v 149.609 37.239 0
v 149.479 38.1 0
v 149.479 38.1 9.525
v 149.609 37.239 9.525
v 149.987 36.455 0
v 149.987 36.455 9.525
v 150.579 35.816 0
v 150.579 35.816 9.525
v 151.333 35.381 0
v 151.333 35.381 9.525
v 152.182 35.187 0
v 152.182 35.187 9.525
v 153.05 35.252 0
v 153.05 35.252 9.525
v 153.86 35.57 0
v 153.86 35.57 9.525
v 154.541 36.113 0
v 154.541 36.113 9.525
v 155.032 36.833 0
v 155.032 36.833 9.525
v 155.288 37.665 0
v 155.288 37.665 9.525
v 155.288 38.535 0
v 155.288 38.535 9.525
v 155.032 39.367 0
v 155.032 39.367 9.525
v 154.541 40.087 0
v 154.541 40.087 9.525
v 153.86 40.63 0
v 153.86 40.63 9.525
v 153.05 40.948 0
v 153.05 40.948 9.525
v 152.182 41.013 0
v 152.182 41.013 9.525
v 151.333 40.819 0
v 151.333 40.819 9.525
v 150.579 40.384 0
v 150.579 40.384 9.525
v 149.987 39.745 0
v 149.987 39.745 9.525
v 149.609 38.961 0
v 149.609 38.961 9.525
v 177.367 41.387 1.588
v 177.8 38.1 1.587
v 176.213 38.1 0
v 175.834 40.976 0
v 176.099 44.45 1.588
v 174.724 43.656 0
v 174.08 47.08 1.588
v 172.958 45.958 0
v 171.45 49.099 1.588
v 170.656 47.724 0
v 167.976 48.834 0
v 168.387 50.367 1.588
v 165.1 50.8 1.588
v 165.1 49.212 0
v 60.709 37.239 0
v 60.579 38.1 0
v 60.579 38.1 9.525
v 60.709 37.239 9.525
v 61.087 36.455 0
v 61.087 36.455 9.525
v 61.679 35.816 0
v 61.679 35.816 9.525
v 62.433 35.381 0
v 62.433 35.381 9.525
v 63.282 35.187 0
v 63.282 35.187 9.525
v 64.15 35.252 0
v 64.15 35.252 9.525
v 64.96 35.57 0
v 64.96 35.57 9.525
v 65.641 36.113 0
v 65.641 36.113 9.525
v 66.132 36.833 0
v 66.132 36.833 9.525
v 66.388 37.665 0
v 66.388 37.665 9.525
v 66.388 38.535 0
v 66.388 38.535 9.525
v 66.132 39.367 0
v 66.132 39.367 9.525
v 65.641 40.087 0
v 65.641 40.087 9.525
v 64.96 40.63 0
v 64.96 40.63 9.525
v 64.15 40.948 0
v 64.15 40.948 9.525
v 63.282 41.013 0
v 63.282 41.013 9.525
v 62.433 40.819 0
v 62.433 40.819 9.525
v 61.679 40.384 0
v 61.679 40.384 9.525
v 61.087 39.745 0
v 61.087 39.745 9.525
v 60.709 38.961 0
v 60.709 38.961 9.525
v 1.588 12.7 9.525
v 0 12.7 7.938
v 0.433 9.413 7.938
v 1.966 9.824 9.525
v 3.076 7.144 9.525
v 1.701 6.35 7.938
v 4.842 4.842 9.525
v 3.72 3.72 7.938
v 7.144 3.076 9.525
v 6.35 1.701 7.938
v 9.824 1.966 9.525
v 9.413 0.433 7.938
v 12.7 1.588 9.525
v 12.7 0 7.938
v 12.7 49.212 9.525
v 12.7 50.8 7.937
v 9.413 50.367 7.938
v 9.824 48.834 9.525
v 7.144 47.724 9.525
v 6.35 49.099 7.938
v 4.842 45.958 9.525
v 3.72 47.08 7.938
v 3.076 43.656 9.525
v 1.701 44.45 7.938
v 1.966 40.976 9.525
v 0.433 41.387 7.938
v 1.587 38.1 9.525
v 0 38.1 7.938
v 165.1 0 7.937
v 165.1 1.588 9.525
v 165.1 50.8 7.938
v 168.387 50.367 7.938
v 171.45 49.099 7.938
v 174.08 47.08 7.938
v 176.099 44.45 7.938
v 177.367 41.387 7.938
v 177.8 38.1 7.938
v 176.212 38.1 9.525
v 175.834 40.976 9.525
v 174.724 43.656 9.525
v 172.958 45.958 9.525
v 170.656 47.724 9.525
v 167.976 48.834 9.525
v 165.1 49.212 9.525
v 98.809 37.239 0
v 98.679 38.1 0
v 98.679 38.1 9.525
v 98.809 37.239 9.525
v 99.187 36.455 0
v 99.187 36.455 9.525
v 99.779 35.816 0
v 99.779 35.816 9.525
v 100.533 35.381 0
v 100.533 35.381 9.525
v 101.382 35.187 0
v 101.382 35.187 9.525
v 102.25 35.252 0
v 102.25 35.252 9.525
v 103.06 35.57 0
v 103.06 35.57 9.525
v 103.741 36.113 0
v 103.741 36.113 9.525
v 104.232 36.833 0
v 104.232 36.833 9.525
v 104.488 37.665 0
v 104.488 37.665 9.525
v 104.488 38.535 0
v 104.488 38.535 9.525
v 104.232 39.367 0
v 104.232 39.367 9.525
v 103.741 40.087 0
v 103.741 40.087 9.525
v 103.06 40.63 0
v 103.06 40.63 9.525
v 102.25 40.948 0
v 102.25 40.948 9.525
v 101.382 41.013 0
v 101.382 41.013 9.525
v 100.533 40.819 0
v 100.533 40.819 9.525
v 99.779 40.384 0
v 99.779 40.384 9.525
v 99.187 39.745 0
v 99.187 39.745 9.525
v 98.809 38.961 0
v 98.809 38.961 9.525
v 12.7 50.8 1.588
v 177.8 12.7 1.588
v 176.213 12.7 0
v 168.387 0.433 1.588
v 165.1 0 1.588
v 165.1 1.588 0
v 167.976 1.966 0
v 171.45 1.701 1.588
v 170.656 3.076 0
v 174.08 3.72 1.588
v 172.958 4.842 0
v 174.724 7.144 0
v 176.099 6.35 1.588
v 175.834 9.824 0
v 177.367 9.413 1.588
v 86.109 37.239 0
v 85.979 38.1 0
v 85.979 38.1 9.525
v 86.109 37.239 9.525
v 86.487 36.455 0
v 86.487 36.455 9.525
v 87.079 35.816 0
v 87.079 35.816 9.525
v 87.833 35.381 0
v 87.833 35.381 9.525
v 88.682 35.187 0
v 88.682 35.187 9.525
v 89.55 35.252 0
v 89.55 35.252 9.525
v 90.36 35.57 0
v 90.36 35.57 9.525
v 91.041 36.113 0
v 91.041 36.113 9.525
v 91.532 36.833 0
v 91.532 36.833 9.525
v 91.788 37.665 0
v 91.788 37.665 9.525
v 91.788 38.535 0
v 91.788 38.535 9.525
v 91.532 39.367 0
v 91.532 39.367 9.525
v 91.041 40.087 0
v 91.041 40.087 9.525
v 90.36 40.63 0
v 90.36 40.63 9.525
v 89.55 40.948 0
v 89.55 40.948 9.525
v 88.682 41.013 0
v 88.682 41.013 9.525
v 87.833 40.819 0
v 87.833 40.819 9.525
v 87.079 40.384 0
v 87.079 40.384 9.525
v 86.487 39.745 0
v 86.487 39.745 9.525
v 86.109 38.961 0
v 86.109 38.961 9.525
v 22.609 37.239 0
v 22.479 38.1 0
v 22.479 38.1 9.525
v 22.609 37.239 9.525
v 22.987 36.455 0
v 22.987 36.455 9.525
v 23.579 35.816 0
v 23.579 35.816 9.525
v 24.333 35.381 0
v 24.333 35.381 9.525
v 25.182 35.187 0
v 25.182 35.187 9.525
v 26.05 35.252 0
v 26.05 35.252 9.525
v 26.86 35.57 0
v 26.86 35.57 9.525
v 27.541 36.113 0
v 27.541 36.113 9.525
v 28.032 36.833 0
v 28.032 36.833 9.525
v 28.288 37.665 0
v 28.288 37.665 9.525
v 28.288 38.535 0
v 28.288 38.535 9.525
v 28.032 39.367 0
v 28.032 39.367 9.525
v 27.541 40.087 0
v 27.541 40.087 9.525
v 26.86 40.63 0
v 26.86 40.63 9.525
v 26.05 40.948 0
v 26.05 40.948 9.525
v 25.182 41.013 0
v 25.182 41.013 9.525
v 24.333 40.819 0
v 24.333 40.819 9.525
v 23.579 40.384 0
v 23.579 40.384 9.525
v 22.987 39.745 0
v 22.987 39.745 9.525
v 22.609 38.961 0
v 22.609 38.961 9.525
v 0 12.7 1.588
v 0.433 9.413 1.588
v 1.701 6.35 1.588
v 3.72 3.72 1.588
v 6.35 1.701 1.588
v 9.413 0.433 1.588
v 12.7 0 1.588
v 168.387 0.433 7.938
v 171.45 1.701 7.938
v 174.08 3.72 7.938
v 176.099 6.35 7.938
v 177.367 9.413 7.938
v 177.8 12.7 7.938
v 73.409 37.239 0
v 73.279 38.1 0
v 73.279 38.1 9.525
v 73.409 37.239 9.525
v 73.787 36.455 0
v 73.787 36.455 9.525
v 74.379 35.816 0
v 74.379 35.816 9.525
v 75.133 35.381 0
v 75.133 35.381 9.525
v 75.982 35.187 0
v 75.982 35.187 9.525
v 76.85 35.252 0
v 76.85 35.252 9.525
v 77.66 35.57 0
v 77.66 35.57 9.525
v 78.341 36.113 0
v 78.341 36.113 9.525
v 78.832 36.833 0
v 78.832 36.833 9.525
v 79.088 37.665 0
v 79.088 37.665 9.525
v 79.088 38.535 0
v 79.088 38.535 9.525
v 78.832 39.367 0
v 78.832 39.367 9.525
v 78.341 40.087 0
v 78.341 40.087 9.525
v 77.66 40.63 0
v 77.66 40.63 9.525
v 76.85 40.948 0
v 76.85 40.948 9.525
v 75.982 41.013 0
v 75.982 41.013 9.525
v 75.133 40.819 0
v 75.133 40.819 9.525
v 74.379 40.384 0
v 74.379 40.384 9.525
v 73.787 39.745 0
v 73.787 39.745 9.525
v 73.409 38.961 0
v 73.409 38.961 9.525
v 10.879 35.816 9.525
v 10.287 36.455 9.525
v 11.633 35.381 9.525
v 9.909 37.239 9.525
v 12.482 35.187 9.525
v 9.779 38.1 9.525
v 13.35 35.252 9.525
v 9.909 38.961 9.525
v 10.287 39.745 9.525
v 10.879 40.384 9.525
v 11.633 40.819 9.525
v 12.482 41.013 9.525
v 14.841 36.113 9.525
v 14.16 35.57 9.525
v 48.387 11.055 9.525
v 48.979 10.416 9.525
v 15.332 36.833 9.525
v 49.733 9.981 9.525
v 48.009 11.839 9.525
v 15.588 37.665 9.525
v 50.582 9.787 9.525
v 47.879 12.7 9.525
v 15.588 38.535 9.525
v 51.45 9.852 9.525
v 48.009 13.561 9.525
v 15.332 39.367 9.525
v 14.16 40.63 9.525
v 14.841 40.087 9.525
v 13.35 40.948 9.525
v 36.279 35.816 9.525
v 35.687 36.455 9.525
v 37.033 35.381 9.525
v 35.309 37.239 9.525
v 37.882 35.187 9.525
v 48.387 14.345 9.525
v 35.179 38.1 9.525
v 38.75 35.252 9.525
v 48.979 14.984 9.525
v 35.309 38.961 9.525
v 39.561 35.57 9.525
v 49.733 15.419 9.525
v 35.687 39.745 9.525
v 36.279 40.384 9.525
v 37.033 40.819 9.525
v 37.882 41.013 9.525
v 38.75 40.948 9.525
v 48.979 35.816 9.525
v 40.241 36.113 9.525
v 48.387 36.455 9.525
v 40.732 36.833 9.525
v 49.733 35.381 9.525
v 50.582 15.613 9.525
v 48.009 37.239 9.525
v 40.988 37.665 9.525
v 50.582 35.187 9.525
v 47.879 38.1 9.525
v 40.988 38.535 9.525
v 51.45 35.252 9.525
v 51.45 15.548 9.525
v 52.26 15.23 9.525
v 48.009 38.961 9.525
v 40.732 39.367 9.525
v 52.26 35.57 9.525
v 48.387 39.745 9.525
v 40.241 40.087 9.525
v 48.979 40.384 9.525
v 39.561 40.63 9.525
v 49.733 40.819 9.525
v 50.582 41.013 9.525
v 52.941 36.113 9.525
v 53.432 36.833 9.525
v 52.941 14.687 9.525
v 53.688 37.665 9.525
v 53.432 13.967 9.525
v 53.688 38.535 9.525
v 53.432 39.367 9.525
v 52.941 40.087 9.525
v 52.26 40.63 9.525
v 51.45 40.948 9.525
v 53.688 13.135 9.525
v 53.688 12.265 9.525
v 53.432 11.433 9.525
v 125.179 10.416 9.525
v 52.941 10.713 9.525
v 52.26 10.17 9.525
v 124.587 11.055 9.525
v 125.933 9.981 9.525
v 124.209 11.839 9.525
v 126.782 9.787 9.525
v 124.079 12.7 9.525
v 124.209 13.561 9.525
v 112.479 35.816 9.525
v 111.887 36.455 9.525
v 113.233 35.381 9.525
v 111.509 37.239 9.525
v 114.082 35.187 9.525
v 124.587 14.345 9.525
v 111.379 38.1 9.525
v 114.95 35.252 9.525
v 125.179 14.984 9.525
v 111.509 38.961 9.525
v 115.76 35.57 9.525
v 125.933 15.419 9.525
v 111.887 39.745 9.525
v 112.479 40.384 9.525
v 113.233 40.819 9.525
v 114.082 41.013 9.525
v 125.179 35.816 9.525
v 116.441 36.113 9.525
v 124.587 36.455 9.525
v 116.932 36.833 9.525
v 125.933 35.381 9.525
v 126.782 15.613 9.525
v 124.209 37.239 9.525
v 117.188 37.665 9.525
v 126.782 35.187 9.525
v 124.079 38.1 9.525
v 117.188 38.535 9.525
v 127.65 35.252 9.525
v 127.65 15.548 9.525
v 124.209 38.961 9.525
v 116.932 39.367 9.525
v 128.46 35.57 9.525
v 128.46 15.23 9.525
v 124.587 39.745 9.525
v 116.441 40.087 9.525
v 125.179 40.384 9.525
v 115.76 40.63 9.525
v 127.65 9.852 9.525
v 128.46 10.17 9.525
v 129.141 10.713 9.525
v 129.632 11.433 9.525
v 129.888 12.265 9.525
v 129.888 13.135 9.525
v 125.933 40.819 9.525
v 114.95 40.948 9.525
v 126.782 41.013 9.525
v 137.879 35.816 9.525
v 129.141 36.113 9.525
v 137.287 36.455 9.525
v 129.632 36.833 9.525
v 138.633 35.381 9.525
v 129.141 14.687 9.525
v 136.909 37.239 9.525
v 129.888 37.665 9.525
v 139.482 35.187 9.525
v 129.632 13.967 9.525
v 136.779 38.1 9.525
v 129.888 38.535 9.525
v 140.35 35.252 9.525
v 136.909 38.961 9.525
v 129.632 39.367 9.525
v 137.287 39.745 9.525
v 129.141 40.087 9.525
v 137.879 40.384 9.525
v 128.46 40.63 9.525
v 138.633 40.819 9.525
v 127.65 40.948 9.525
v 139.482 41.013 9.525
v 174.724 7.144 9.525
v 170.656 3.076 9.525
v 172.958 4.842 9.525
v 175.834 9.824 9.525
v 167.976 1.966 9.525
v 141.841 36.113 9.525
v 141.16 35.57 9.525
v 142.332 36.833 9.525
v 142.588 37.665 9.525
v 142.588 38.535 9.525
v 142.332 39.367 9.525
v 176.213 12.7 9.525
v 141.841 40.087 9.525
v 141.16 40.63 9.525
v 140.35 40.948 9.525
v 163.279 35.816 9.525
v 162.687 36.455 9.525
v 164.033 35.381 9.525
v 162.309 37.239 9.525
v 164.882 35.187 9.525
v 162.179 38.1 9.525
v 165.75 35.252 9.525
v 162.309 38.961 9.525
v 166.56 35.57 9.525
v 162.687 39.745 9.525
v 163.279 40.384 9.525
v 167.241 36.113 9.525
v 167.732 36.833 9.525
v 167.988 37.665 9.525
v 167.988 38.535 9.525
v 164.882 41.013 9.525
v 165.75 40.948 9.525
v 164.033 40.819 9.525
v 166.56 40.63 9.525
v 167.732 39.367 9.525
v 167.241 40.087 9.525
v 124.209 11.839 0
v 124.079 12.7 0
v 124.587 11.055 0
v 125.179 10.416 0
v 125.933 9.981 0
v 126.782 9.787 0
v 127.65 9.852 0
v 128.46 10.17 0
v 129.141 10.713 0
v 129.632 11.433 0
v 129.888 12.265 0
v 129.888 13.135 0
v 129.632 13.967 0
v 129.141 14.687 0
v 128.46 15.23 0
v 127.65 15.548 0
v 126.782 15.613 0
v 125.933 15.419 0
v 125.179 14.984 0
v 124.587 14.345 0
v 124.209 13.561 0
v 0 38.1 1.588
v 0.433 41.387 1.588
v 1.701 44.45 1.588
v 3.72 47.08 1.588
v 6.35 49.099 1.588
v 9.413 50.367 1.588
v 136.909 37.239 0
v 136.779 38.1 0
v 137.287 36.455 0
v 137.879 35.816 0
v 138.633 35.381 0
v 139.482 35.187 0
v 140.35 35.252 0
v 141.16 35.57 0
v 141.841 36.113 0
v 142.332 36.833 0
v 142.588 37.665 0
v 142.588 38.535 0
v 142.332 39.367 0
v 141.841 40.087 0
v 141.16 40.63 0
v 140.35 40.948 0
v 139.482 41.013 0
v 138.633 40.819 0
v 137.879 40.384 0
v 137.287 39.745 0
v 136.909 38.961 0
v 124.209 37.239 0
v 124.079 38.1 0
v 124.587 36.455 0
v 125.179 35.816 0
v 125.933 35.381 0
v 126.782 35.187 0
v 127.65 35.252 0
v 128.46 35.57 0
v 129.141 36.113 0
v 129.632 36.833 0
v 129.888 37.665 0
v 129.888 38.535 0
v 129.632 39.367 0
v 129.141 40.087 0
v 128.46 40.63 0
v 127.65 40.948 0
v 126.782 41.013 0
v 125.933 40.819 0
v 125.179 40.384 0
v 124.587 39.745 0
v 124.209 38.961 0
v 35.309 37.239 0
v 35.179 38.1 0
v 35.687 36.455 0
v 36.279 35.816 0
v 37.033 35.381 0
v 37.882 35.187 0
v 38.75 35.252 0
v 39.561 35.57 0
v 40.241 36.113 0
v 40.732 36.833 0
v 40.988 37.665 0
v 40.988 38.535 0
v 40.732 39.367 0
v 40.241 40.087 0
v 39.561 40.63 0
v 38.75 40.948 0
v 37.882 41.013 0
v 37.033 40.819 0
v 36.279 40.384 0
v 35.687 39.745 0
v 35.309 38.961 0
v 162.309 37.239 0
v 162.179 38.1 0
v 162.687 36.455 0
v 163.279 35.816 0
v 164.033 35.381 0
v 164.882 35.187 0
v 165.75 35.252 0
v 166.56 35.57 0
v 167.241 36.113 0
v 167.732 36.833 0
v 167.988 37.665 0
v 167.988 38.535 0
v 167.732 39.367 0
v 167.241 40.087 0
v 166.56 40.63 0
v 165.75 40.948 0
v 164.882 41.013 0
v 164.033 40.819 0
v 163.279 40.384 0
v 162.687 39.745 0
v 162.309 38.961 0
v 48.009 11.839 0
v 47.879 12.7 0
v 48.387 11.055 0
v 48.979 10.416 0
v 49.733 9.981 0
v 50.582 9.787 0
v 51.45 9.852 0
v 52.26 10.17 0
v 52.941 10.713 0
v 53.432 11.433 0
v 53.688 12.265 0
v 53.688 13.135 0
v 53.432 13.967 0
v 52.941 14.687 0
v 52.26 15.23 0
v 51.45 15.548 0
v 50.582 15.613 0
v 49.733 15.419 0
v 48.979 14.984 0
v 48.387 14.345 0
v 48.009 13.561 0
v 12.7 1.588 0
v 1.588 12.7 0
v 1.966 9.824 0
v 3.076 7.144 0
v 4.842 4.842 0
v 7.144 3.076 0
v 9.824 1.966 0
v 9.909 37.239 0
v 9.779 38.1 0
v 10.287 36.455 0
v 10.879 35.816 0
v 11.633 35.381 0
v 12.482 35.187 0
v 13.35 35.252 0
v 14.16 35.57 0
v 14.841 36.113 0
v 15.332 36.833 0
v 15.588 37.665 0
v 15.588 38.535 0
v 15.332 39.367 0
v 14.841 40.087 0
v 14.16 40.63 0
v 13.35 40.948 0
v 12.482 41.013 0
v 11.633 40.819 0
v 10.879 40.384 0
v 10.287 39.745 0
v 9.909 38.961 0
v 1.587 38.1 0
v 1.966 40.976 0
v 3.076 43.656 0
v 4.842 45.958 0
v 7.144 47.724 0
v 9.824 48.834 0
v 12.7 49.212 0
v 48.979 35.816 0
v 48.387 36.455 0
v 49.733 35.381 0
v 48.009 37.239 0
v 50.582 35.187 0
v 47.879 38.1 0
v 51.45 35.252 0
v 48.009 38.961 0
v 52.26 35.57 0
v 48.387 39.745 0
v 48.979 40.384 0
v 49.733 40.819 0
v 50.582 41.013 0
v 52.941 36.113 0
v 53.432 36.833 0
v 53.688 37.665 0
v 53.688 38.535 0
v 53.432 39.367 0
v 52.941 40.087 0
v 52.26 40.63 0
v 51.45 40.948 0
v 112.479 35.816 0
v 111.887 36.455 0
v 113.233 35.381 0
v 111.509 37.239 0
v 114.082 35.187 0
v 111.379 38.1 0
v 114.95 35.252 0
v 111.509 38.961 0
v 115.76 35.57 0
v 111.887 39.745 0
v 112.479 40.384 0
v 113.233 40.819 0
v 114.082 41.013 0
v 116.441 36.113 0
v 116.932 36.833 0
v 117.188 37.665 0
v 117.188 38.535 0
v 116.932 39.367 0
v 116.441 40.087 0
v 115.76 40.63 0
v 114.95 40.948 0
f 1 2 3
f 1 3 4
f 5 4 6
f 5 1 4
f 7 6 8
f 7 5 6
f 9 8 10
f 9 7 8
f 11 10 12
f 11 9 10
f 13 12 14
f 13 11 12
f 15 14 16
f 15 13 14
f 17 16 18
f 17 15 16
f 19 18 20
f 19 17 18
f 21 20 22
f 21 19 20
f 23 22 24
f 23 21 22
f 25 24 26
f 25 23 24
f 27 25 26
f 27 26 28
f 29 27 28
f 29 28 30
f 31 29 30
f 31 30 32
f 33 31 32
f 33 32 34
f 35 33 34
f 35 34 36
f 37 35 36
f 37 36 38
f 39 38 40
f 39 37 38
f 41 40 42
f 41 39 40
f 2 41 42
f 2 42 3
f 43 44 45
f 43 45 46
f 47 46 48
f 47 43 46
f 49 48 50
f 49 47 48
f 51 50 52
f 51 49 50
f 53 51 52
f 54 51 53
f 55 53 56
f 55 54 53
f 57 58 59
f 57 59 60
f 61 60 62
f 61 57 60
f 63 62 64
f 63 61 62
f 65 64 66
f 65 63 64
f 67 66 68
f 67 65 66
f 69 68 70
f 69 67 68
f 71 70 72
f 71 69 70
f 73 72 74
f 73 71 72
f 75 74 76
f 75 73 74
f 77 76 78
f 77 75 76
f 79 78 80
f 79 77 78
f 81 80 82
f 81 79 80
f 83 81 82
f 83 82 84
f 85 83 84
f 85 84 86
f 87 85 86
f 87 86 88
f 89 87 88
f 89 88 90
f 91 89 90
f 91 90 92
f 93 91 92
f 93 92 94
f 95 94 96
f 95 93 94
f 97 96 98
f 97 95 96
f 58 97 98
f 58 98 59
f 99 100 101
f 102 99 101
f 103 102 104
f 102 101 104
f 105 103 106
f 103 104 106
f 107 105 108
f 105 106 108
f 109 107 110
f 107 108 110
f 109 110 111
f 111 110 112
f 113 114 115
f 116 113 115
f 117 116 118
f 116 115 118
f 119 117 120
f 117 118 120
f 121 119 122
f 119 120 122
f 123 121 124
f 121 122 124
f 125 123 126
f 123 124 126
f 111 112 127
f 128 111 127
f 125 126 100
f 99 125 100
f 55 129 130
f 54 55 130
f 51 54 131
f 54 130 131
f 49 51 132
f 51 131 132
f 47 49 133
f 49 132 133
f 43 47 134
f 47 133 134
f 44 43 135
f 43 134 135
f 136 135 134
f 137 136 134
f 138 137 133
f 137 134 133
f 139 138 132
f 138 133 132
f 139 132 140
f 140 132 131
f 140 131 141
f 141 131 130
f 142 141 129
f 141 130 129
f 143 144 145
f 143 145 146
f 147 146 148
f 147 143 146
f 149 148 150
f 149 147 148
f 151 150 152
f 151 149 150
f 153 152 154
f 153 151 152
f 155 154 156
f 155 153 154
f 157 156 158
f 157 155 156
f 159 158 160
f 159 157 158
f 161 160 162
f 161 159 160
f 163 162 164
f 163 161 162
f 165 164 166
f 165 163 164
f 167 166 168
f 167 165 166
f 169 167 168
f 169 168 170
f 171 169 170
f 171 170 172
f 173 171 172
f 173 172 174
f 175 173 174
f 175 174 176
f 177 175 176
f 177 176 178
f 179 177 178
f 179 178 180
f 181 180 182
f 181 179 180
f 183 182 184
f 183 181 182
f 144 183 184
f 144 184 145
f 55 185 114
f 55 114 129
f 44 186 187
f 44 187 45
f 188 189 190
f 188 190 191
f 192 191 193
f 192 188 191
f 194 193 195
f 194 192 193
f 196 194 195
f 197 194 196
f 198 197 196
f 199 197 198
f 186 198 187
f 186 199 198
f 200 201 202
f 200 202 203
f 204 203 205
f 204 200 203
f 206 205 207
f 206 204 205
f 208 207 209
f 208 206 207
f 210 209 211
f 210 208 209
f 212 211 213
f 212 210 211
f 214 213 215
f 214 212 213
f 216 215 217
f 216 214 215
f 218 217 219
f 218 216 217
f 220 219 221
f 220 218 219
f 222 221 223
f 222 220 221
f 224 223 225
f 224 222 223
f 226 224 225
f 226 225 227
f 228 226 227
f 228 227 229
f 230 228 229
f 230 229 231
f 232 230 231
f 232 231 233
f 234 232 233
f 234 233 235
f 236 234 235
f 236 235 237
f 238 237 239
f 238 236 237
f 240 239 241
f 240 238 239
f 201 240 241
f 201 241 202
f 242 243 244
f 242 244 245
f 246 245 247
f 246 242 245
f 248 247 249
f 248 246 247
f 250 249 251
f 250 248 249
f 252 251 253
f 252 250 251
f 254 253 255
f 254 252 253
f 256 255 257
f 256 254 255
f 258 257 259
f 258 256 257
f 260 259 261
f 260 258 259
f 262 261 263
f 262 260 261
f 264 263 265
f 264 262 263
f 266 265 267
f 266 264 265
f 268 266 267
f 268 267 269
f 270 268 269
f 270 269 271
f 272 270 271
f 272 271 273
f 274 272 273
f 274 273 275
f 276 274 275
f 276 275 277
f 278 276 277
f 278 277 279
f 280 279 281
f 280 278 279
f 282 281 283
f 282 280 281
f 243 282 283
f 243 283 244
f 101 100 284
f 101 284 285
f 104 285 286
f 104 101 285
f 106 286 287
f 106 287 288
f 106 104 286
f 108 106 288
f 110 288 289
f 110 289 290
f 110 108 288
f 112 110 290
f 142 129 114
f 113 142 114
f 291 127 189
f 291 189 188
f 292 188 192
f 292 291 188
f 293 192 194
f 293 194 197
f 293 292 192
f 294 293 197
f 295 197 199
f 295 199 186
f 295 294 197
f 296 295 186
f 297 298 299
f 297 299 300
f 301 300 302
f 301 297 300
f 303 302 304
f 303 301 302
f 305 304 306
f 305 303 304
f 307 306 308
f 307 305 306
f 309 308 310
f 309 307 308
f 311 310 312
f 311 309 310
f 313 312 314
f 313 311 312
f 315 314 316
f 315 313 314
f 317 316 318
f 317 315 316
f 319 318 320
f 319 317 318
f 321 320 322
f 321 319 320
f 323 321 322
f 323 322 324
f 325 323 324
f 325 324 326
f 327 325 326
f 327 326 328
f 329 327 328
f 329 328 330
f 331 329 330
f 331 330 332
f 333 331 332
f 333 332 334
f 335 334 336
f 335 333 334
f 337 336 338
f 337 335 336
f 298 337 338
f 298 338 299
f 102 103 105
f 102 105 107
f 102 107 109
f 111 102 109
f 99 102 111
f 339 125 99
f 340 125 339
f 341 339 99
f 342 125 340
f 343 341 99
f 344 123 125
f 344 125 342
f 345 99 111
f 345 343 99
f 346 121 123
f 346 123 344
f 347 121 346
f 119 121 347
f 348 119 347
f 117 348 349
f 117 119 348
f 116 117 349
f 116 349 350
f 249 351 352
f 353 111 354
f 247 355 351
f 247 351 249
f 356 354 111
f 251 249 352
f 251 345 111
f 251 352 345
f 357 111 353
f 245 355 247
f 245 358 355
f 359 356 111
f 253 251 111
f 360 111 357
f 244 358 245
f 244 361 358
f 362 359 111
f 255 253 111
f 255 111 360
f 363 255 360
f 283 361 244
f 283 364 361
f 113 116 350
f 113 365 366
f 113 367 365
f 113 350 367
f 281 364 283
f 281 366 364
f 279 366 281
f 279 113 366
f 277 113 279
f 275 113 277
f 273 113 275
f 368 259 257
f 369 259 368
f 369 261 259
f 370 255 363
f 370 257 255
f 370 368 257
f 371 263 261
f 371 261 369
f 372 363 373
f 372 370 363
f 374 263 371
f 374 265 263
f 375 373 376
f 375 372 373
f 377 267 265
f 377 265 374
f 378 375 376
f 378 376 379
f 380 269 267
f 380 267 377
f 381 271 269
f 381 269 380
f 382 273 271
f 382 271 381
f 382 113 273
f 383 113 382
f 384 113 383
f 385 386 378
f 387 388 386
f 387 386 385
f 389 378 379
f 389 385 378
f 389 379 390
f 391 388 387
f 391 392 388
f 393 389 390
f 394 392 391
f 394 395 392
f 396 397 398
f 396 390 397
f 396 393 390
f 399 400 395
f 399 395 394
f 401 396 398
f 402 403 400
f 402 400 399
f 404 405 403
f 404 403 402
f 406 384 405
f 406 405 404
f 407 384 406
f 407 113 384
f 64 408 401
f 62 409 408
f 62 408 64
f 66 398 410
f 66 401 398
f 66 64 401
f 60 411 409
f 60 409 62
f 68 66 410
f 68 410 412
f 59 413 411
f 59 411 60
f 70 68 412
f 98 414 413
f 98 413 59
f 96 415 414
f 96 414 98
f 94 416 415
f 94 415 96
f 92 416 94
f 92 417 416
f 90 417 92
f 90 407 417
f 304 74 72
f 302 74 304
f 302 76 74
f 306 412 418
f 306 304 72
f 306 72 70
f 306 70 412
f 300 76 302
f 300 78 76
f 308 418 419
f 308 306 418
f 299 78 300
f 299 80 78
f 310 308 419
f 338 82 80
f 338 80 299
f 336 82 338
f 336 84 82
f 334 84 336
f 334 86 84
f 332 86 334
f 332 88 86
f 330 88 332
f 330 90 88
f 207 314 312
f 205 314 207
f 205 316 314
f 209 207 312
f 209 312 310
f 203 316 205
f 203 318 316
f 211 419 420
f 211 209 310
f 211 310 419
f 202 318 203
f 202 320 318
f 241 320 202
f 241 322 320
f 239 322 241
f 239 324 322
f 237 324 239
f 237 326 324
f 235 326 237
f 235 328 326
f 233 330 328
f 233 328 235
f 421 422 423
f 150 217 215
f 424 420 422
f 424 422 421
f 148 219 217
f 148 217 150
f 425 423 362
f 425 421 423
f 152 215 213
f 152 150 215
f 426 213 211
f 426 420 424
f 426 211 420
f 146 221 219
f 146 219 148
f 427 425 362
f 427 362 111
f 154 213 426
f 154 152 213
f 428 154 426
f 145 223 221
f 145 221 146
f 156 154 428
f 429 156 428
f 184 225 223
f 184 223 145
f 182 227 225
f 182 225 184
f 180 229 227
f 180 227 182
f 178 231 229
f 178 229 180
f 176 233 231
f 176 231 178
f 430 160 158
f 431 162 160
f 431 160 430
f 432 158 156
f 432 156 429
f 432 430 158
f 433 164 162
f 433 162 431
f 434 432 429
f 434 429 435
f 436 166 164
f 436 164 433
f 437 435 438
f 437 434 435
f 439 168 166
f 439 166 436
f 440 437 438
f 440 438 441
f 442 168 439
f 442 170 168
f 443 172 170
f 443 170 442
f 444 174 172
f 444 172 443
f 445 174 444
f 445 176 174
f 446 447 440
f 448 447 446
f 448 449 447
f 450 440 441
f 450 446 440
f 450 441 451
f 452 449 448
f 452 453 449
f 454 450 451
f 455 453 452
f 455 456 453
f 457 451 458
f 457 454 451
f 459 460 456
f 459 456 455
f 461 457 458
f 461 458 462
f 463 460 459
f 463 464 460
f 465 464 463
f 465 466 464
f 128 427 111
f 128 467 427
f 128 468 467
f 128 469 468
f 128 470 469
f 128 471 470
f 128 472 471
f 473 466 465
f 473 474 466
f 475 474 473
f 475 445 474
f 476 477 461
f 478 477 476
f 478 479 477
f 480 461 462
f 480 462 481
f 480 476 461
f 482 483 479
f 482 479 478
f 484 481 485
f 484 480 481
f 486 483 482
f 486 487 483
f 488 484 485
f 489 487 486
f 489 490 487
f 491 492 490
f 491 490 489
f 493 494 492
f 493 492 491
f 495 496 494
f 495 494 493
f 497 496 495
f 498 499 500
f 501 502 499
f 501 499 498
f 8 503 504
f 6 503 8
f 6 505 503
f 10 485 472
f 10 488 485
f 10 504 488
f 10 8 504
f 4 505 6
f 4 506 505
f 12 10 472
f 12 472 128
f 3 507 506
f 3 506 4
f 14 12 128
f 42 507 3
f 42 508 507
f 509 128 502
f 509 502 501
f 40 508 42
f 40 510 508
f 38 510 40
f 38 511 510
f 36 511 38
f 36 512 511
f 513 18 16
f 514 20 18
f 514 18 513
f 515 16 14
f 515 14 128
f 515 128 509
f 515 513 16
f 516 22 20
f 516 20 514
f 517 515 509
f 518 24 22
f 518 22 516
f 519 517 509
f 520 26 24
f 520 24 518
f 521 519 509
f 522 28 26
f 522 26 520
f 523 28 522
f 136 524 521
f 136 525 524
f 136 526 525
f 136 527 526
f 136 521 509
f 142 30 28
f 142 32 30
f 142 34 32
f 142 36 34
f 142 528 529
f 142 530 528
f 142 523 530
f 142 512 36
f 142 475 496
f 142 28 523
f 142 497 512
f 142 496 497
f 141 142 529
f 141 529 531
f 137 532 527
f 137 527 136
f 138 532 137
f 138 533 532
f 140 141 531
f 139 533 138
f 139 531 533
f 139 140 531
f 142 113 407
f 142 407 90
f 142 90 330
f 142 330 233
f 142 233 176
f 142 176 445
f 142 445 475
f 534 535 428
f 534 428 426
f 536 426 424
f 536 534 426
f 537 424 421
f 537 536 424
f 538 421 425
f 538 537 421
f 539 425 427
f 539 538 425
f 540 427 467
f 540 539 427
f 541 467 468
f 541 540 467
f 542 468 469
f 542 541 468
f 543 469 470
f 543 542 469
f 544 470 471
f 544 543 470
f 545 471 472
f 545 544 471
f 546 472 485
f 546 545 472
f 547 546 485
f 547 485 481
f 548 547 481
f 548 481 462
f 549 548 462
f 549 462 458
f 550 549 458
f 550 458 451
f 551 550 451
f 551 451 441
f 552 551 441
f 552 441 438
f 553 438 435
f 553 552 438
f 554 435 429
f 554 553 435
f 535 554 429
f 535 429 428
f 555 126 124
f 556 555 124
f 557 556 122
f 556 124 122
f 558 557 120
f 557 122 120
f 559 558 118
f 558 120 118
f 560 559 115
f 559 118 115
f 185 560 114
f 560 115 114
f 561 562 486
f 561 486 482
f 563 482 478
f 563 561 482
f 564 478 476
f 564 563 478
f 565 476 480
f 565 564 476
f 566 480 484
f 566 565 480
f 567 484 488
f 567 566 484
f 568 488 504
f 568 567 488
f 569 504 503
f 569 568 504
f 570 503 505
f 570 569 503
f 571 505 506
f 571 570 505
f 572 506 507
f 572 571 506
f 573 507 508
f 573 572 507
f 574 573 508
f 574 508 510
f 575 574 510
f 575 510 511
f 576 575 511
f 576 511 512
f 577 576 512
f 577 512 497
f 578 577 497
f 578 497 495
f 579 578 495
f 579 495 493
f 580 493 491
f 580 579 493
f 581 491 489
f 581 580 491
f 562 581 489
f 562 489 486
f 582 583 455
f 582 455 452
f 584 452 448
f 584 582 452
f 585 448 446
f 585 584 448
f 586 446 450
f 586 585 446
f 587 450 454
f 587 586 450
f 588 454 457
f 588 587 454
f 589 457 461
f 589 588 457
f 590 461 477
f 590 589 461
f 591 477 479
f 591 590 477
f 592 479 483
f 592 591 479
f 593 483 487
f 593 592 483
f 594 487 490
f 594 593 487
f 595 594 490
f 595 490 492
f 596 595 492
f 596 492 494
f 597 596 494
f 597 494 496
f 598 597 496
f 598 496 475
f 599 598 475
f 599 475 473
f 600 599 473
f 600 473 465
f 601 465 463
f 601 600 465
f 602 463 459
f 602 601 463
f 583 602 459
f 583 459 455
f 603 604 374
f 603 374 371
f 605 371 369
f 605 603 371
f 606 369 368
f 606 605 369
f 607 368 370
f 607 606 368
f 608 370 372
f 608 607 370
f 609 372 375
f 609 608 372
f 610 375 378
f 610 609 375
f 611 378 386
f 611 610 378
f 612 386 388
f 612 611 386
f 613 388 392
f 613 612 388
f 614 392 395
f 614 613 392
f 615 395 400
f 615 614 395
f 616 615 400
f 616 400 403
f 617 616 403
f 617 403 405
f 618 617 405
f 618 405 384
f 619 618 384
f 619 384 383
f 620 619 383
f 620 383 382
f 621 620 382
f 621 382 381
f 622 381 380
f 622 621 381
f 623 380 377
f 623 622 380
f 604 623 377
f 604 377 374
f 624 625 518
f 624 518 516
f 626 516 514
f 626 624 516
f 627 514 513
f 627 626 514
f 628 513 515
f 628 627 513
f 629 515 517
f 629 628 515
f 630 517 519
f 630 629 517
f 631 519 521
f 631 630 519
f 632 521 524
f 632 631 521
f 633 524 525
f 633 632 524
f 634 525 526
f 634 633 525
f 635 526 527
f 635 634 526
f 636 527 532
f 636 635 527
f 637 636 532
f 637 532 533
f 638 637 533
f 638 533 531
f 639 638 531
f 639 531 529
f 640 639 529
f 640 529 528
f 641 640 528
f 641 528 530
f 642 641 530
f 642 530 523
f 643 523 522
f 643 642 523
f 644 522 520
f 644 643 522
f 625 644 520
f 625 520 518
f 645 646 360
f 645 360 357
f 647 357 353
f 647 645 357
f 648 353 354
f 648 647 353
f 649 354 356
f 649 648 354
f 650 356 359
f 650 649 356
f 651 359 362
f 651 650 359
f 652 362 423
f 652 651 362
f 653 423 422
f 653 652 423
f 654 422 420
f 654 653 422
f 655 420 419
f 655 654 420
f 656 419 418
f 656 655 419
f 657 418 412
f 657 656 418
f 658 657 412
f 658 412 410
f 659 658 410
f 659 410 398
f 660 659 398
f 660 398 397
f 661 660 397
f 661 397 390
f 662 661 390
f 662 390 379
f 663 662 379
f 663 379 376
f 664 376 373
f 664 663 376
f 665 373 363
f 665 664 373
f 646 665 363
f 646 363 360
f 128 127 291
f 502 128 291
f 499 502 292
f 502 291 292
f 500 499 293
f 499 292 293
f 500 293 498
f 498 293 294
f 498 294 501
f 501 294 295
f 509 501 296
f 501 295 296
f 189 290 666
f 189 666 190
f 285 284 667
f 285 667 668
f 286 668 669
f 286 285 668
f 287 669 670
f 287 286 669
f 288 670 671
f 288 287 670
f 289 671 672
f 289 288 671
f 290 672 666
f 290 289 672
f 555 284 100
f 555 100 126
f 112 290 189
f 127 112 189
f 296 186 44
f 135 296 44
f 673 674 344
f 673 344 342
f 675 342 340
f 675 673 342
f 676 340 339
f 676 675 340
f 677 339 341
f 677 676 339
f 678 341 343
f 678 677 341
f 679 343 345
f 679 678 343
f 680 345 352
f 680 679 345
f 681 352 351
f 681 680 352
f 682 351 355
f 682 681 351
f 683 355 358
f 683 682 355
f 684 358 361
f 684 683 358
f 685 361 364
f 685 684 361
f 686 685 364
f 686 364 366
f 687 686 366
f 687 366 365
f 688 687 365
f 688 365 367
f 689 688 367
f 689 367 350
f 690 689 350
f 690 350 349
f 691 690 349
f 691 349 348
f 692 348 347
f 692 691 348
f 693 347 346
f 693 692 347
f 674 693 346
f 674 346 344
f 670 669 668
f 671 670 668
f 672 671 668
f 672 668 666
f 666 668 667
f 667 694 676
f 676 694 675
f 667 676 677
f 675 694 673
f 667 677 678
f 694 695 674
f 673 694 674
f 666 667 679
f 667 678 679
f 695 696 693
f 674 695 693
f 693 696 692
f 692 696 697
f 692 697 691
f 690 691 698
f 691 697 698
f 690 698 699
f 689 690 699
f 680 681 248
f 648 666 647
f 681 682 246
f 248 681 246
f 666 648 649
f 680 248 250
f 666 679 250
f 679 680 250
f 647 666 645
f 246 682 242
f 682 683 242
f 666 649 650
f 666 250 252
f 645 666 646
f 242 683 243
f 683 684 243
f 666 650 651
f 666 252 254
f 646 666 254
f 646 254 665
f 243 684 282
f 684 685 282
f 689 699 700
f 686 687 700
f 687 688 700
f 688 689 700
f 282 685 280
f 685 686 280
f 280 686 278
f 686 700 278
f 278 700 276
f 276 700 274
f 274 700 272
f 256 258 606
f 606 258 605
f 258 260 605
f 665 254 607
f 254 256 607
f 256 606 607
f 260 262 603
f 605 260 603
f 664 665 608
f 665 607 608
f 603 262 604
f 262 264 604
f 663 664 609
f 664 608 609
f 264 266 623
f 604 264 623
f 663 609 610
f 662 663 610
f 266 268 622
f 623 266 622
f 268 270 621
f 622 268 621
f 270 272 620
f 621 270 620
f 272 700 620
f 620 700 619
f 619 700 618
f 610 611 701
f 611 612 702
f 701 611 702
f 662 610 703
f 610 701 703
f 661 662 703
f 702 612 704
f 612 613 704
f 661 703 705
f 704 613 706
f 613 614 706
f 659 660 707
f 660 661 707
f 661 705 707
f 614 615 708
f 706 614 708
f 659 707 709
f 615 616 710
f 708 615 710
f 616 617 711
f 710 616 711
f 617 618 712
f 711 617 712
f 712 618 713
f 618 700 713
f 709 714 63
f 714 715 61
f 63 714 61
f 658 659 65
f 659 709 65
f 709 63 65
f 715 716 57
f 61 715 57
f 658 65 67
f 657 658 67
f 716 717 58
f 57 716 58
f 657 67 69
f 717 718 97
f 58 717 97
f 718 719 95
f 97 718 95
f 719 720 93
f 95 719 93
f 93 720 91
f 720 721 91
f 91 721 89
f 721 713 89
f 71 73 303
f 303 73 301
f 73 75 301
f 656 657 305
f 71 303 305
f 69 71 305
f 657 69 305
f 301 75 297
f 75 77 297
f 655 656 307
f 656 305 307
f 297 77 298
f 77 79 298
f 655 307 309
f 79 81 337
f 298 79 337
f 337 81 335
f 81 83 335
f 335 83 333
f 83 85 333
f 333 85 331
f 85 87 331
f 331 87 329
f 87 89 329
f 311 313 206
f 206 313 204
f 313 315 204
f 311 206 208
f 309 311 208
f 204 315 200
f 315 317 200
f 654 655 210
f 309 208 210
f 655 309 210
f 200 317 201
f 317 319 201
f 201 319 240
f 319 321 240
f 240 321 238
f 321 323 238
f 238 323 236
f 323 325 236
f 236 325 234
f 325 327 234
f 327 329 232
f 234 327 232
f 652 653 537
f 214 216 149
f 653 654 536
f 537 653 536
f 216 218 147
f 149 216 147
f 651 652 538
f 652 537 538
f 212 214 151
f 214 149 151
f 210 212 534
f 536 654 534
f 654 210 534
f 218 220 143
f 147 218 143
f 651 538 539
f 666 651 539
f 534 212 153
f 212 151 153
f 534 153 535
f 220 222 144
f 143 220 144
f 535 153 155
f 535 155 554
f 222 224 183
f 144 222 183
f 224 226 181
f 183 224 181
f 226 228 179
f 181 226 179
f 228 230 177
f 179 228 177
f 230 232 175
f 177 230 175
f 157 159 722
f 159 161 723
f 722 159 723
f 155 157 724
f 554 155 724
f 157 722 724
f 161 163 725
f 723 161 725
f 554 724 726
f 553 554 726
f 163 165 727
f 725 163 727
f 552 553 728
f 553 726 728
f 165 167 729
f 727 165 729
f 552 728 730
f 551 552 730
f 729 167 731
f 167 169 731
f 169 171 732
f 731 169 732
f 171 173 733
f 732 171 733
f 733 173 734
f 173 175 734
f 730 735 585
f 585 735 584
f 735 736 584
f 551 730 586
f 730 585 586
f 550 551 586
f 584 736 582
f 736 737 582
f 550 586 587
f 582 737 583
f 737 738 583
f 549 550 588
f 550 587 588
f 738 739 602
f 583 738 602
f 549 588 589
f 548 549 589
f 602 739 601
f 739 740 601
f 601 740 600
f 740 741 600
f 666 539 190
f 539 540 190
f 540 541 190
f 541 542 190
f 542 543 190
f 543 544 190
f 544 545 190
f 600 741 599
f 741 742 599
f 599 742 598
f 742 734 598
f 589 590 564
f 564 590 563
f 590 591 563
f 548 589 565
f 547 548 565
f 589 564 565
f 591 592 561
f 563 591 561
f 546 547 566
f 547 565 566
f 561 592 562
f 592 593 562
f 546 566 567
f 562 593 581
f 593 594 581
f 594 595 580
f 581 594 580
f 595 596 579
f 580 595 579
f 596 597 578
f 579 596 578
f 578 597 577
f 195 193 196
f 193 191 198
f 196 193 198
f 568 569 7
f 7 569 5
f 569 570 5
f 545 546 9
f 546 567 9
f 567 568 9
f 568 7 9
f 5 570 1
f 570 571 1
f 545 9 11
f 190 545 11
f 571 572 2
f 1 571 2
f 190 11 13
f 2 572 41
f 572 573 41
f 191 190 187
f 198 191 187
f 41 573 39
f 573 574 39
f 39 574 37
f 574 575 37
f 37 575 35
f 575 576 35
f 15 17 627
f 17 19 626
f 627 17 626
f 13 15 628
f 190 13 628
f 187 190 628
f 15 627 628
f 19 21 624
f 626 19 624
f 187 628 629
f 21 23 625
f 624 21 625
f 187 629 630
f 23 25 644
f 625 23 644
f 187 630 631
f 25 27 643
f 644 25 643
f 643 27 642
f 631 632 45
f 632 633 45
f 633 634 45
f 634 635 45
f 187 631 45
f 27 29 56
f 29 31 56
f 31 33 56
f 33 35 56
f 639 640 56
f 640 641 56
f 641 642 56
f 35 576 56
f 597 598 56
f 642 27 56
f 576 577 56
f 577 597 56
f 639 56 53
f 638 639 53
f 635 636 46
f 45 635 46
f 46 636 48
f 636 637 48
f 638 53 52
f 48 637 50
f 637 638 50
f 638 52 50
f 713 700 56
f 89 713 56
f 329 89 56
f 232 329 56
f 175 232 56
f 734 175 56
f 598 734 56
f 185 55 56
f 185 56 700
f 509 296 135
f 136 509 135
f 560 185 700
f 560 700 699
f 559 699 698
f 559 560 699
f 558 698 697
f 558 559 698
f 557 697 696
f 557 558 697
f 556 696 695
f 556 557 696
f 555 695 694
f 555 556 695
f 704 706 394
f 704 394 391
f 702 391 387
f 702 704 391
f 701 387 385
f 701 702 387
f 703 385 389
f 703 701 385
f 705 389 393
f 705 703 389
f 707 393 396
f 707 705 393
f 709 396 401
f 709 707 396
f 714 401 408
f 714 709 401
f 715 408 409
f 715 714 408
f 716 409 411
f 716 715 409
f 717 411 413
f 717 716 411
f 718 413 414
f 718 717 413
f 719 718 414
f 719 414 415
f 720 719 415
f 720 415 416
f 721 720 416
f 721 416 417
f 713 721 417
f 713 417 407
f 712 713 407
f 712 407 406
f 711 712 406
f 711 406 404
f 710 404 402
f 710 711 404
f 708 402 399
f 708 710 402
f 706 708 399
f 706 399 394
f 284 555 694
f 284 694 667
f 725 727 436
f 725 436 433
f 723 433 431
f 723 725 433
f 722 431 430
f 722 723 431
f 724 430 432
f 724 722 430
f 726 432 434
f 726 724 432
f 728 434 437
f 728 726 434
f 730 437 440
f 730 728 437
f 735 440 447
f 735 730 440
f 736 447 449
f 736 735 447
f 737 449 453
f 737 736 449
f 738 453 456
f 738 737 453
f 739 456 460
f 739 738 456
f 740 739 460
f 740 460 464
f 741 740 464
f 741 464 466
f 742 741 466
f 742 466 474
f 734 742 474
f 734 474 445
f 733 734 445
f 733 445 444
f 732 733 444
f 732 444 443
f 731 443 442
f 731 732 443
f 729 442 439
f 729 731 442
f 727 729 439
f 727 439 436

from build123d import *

# Parameters (mm, degrees)
SKETCH1_W           = 177.8
SKETCH1_H           = 50.8
SKETCH1_R           = 2.921
BOSS_EXTRUDE1_DEPTH = 9.525
FILLET1_R           = 12.7
CHAMFER1_SIZE       = 1.5875


with BuildPart() as part:
    # Sketch1 → Boss-Extrude1 (new body)
    with BuildSketch(Plane.XY):
        with Locations((88.9, 25.4)):
            Rectangle(SKETCH1_W, SKETCH1_H)
        with Locations(Location((50.8, 12.7, 0), (0, 0, 180))):
            Circle(SKETCH1_R, mode=Mode.SUBTRACT)
        with Locations(Location((127, 12.7, 0), (0, 0, 180))):
            Circle(SKETCH1_R, mode=Mode.SUBTRACT)
        with Locations(Location((12.7, 38.1, 0), (0, 0, 180))):
            Circle(SKETCH1_R, mode=Mode.SUBTRACT)
        with Locations(Location((25.4, 38.1, 0), (0, 0, 180))):
            Circle(SKETCH1_R, mode=Mode.SUBTRACT)
        with Locations(Location((38.1, 38.1, 0), (0, 0, 180))):
            Circle(SKETCH1_R, mode=Mode.SUBTRACT)
        with Locations(Location((50.8, 38.1, 0), (0, 0, 180))):
            Circle(SKETCH1_R, mode=Mode.SUBTRACT)
        with Locations(Location((63.5, 38.1, 0), (0, 0, 180))):
            Circle(SKETCH1_R, mode=Mode.SUBTRACT)
        with Locations(Location((76.2, 38.1, 0), (0, 0, 180))):
            Circle(SKETCH1_R, mode=Mode.SUBTRACT)
        with Locations(Location((88.9, 38.1, 0), (0, 0, 180))):
            Circle(SKETCH1_R, mode=Mode.SUBTRACT)
        with Locations(Location((101.6, 38.1, 0), (0, 0, 180))):
            Circle(SKETCH1_R, mode=Mode.SUBTRACT)
        with Locations(Location((114.3, 38.1, 0), (0, 0, 180))):
            Circle(SKETCH1_R, mode=Mode.SUBTRACT)
        with Locations(Location((127, 38.1, 0), (0, 0, 180))):
            Circle(SKETCH1_R, mode=Mode.SUBTRACT)
        with Locations(Location((139.7, 38.1, 0), (0, 0, 180))):
            Circle(SKETCH1_R, mode=Mode.SUBTRACT)
        with Locations(Location((152.4, 38.1, 0), (0, 0, 180))):
            Circle(SKETCH1_R, mode=Mode.SUBTRACT)
        with Locations(Location((165.1, 38.1, 0), (0, 0, 180))):
            Circle(SKETCH1_R, mode=Mode.SUBTRACT)
    extrude(amount=BOSS_EXTRUDE1_DEPTH)

    # Fillet1
    fillet1_edges = [part.edges().sort_by_distance(p)[0] for p in [
        (0, 50.8, 4.7625),
        (177.8, 50.8, 4.7625),
        (177.8, 0, 4.7625),
        (0, 0, 4.7625),
    ]]
    fillet(fillet1_edges, radius=FILLET1_R)

    # Chamfer1
    chamfer1_edges = [part.edges().sort_by_distance(p)[0] for p in [
        (88.9, 0, 0),
        (88.9, 0, 9.525),
        (0, 25.4, 0),
        (88.9, 50.8, 0),
        (177.8, 25.4, 0),
        (174.080256121, 47.080256121, 0),
        (174.080256121, 3.719743879, 0),
        (3.719743879, 47.080256121, 0),
        (3.719743879, 3.719743879, 0),
        (0, 25.4, 9.525),
        (177.8, 25.4, 9.525),
        (88.9, 50.8, 9.525),
        (174.080256121, 47.080256121, 9.525),
        (174.080256121, 3.719743879, 9.525),
        (3.719743879, 47.080256121, 9.525),
        (3.719743879, 3.719743879, 9.525),
    ]]
    chamfer(chamfer1_edges, length=CHAMFER1_SIZE)


solid = part.part
